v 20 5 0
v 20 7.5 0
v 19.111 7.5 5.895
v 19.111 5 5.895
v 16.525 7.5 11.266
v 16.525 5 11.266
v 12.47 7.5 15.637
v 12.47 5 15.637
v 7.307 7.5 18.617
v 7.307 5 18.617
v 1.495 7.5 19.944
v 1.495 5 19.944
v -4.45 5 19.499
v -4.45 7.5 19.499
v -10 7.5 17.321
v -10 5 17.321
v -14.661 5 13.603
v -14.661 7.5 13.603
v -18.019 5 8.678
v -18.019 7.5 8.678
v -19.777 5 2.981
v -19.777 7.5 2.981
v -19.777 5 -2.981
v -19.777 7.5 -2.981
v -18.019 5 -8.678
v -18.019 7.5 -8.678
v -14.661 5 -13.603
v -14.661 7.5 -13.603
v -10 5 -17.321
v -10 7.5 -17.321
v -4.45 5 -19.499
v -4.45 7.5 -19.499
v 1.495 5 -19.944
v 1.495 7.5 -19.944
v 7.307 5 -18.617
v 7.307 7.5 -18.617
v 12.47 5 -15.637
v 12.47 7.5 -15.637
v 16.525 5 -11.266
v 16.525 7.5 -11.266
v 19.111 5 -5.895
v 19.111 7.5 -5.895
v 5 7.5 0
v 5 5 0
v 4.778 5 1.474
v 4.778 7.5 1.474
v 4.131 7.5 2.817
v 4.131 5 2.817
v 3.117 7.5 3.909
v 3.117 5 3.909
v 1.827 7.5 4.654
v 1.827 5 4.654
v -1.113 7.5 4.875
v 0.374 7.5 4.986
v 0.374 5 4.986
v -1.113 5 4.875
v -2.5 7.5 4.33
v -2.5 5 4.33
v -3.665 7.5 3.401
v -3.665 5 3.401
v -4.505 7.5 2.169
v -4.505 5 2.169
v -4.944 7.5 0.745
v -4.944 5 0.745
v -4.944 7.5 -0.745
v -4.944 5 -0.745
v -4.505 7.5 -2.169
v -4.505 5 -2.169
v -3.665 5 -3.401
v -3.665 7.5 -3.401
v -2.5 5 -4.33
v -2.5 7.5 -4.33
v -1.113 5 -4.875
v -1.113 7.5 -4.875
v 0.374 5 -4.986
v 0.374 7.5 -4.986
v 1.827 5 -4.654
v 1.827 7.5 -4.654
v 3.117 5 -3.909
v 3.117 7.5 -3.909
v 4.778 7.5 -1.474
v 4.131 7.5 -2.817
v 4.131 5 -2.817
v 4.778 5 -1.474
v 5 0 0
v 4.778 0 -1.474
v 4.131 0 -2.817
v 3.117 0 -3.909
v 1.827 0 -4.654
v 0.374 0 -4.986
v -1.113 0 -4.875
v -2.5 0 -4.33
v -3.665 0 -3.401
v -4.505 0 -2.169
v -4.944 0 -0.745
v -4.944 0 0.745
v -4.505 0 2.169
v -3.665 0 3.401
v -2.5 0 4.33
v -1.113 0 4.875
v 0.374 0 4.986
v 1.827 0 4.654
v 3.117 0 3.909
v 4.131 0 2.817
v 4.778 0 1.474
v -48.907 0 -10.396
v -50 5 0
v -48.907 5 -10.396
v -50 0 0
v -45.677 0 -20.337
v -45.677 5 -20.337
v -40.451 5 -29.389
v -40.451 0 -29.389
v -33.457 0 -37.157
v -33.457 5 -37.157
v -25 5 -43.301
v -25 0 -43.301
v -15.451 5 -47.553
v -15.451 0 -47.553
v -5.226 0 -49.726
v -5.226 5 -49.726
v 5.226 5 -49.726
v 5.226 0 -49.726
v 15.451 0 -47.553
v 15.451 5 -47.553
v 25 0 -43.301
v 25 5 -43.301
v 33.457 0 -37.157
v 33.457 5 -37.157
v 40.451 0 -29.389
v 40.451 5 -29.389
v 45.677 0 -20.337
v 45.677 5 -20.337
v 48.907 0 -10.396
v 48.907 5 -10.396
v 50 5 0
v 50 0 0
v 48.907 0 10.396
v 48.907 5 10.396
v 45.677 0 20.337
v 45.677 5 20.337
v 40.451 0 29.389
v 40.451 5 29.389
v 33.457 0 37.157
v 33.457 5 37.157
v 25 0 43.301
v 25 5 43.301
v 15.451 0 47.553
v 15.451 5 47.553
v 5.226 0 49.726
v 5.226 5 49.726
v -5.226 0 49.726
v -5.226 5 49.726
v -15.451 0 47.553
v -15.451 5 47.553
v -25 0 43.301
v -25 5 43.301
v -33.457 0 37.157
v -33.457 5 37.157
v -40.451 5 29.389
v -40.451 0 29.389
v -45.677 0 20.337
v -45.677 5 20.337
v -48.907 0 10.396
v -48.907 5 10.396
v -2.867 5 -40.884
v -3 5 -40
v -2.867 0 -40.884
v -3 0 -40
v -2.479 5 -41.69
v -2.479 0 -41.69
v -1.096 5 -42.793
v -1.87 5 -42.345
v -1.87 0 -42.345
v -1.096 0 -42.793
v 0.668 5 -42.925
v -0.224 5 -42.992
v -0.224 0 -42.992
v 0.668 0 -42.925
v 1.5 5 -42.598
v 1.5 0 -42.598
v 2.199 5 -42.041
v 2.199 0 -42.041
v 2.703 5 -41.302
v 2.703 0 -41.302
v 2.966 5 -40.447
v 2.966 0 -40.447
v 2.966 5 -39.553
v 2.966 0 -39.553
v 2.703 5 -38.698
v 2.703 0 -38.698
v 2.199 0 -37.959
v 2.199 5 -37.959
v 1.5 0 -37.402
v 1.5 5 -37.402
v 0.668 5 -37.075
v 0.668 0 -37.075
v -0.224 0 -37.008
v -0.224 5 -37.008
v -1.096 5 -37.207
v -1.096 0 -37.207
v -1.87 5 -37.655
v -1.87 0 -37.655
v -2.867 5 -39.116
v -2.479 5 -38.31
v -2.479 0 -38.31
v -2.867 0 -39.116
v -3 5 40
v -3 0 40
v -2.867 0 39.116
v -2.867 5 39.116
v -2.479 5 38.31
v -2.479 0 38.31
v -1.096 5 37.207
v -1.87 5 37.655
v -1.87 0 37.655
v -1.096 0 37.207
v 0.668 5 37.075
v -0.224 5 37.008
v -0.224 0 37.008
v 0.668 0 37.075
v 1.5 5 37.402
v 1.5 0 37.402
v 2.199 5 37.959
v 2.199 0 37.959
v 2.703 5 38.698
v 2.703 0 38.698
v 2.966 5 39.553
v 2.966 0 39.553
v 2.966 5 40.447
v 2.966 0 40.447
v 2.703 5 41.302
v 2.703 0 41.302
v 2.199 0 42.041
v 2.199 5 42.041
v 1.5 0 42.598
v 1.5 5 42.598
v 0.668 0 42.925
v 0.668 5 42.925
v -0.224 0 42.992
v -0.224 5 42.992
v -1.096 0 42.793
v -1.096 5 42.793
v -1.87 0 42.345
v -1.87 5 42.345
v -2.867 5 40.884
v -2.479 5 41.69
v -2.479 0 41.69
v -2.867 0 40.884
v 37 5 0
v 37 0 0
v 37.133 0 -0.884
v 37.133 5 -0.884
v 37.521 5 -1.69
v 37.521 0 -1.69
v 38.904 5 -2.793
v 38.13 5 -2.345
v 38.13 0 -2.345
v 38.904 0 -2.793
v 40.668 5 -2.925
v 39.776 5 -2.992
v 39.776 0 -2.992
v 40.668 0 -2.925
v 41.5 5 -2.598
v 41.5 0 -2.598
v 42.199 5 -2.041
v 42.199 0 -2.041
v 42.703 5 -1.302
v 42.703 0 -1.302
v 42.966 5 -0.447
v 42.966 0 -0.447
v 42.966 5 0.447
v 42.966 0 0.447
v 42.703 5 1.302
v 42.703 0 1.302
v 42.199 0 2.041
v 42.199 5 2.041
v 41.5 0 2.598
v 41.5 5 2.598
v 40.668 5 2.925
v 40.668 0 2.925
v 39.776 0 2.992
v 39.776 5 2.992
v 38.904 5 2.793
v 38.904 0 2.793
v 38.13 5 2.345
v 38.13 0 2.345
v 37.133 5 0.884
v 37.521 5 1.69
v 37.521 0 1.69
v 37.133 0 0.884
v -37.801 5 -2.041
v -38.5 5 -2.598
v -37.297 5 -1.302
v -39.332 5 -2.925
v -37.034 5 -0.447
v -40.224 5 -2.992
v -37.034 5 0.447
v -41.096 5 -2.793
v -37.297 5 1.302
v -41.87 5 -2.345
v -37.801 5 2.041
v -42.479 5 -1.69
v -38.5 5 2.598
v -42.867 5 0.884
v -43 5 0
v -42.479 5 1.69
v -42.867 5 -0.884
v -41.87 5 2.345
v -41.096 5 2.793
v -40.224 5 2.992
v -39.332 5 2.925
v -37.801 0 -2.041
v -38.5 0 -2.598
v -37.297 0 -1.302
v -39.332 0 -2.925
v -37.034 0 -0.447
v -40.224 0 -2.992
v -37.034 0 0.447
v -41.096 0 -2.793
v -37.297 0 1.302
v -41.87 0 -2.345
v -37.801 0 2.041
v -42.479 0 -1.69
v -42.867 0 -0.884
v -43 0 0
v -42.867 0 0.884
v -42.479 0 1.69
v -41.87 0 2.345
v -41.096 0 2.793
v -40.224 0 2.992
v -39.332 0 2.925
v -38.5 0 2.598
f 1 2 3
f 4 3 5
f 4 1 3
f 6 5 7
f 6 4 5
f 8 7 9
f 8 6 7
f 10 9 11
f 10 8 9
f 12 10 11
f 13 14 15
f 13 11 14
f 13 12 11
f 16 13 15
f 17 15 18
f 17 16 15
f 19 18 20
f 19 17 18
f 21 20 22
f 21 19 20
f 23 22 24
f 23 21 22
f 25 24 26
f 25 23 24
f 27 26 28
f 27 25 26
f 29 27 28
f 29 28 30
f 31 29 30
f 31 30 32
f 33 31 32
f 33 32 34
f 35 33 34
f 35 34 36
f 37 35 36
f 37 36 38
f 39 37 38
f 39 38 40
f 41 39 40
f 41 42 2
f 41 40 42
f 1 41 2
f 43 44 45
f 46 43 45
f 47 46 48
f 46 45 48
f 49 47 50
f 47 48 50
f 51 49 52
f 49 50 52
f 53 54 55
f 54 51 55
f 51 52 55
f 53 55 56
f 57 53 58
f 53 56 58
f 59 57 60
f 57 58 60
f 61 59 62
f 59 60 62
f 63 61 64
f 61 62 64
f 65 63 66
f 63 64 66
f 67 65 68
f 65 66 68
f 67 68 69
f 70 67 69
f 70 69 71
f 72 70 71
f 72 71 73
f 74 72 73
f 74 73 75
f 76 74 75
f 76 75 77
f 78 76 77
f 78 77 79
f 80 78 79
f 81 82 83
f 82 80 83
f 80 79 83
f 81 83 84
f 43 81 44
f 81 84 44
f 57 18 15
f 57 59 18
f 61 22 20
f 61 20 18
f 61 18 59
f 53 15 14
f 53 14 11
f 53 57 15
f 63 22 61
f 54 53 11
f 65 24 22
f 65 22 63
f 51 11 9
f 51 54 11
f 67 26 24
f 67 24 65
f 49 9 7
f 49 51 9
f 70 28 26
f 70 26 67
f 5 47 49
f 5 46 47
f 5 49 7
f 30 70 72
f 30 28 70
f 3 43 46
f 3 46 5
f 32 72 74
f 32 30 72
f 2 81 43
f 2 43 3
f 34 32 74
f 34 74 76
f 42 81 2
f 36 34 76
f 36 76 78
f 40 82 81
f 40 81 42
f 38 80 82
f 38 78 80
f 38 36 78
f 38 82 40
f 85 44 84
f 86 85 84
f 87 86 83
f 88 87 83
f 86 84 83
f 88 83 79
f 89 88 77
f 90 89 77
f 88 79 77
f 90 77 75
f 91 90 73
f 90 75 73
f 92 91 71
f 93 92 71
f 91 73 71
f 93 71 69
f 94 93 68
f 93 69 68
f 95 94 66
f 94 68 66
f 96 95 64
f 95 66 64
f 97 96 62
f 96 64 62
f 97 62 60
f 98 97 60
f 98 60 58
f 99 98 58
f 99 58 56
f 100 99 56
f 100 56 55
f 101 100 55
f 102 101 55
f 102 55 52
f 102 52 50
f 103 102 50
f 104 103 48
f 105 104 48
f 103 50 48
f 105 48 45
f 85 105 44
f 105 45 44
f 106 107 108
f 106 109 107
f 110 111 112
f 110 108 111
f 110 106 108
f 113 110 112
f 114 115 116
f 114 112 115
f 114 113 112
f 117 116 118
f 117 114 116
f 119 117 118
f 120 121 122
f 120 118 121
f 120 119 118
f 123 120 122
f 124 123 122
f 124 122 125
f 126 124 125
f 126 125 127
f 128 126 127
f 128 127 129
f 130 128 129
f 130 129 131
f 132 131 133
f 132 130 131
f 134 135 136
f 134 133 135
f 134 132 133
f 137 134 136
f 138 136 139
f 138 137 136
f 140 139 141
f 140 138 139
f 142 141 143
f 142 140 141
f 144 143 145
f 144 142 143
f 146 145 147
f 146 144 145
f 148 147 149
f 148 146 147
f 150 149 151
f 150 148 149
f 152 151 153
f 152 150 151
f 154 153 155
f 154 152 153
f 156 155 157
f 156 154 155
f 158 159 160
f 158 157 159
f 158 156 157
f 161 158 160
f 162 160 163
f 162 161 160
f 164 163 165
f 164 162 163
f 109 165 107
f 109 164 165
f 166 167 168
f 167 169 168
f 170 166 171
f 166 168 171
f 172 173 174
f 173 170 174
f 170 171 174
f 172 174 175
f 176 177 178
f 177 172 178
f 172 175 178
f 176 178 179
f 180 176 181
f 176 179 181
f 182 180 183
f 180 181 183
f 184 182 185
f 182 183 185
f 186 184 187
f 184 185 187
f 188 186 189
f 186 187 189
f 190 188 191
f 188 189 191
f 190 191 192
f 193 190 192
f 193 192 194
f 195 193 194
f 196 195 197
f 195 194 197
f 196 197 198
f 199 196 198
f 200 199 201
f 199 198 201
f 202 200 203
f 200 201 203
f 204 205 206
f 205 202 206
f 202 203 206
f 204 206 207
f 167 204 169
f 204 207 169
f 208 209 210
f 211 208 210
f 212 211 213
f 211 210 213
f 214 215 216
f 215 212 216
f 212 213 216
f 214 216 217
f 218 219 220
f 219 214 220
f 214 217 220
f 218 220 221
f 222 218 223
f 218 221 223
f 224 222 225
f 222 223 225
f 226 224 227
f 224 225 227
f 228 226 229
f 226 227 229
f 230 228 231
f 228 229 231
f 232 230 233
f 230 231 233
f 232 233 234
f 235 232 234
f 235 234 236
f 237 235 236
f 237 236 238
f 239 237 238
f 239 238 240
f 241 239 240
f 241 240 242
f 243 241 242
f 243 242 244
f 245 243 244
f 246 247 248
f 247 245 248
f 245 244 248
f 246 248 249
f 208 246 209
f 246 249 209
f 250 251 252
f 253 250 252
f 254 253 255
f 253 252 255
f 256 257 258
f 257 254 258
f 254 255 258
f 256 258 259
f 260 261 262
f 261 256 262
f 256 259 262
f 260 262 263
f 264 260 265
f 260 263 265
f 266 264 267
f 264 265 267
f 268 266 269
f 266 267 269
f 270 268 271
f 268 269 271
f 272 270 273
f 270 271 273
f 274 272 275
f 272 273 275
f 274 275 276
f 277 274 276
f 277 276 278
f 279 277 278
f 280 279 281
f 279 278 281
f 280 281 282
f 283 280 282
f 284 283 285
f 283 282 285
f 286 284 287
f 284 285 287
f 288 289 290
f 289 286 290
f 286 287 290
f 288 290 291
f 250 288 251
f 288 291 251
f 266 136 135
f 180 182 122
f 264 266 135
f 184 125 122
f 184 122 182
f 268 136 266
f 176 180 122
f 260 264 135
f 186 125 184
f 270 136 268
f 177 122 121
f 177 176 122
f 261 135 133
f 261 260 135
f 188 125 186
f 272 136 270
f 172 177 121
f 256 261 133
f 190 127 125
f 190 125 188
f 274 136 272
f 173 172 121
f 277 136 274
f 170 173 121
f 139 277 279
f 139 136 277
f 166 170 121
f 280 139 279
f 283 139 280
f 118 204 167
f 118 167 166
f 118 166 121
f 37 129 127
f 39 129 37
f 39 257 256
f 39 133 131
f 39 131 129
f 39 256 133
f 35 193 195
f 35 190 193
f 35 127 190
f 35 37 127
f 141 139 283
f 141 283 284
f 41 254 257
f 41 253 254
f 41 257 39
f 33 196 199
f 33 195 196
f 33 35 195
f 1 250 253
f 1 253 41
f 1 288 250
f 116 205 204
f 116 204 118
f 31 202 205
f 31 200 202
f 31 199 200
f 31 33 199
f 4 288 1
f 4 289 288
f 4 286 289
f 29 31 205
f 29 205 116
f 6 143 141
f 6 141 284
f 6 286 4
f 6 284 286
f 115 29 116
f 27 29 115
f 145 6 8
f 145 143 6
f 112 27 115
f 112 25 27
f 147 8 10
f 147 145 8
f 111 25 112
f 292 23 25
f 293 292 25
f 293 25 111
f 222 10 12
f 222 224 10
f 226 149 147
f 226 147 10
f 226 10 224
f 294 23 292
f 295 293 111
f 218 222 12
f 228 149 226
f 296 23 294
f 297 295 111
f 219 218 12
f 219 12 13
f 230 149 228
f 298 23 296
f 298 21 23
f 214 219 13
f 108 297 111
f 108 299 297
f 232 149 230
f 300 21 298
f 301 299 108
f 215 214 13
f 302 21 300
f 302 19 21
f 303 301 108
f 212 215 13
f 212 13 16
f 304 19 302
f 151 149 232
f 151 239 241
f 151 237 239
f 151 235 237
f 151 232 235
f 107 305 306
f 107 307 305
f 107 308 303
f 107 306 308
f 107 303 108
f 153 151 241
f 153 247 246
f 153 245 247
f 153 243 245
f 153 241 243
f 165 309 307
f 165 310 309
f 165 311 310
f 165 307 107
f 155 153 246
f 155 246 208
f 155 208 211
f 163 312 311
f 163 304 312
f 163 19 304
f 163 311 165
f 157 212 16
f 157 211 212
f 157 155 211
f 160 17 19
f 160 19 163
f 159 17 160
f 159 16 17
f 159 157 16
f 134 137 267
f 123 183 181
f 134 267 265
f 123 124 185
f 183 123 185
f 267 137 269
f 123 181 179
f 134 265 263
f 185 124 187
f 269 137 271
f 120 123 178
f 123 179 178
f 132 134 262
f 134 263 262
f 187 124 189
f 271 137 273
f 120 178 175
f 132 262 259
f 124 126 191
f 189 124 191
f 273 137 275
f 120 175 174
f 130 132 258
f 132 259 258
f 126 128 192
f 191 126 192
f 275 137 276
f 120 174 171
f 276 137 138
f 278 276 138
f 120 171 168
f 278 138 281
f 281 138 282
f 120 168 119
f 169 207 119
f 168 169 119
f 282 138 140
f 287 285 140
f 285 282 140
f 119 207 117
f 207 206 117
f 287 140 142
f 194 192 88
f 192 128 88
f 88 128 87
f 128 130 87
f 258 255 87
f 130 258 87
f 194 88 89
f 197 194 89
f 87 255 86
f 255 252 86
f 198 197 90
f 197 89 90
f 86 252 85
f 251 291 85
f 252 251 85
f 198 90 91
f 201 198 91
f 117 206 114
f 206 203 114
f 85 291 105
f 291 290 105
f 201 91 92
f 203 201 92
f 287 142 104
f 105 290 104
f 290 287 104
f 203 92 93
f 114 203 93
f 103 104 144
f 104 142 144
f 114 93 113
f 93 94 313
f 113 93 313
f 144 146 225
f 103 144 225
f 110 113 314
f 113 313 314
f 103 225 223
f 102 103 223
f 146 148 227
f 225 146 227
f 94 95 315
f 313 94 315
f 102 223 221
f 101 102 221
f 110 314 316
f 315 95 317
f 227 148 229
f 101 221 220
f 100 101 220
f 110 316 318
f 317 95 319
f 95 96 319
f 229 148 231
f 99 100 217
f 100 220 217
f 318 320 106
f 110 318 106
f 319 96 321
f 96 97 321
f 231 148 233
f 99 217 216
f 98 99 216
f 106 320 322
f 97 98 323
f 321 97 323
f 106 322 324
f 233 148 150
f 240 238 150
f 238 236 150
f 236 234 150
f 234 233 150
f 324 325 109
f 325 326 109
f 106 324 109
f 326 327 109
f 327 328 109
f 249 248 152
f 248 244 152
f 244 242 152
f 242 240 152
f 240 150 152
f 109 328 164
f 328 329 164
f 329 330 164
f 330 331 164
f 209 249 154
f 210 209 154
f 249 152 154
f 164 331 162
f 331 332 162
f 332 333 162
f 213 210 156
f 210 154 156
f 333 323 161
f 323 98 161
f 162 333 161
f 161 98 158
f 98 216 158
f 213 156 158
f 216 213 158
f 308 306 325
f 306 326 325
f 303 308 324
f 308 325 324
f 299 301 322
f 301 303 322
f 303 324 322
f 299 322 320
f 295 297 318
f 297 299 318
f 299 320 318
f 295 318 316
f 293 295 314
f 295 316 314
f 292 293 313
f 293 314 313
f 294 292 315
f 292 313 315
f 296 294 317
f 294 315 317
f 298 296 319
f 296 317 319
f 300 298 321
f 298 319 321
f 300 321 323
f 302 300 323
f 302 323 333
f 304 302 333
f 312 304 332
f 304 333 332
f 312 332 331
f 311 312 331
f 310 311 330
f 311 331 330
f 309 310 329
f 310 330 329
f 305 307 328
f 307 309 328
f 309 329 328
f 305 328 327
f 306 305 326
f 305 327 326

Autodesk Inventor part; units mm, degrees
ref_plane "YZ Plane" through (0, 0, 0) normal (1, 0, 0) x (0, 1, 0)
ref_plane "XZ Plane" through (0, 0, 0) normal (0, 1, 0) x (-1, 0, 0)
ref_plane "XY Plane" through (0, 0, 0) normal (0, 0, 1) x (1, 0, 0)
sketch "Szkic1" plane through (0, 0, 0) normal (0, 1, 0) x (-1, 0, 0)
  circle A0 centre (0, 0) radius 50
  circle A1 centre (0, 40) radius 3
  circle A2 centre (0, -40) radius 3
  circle A3 centre (40, 0) radius 3
  circle A4 centre (-40, 0) radius 3
  circle A5 centre (0, 0) radius 20
  dimension "d0" = 100
  dimension "d1" = 6
  dimension "d2" = 6
  dimension "d3" = 6
  dimension "d4" = 6
  dimension "d5" = 40
  dimension "d6" = 80
  dimension "d7" = 40
  dimension "d8" = 80
  dimension "d9" = 40
extrude "Wyciągnięcie proste1" add sketch "Szkic1" along normal blind 5
sketch "Szkic2" plane through (0, 5, 0) normal (0, 1, 0) x (1, 0, 0)
  point P0 (0, 0)
sketch "Szkic3" plane through (0, 5, 0) normal (0, 1, 0) x (1, 0, 0)
  circle A0 centre (0, 0) radius 20
  circle A1 centre (0, 0) radius 5
  dimension "d12" = 40
  dimension "d13" = 10
extrude "Wyciągnięcie proste2" add sketch "Szkic3" along normal blind 2.5 and the other way blind 5
thread "Gwint1" size "M10x1.5" class "6H" standard "ANSI Metric M Profile" length 100
thread "Gwint2" size "M10x1.5" class "6H" standard "ANSI Metric M Profile" length 100
thread "Gwint3" size "M10x1.5" class "6H" standard "ANSI Metric M Profile" length 100
thread "Gwint4" size "M10x1.5" class "6H" standard "ANSI Metric M Profile" length 100
thread "Gwint5" size "M10x1.5" class "6H" standard "ANSI Metric M Profile" length 31.37
properties part number "płytka"
